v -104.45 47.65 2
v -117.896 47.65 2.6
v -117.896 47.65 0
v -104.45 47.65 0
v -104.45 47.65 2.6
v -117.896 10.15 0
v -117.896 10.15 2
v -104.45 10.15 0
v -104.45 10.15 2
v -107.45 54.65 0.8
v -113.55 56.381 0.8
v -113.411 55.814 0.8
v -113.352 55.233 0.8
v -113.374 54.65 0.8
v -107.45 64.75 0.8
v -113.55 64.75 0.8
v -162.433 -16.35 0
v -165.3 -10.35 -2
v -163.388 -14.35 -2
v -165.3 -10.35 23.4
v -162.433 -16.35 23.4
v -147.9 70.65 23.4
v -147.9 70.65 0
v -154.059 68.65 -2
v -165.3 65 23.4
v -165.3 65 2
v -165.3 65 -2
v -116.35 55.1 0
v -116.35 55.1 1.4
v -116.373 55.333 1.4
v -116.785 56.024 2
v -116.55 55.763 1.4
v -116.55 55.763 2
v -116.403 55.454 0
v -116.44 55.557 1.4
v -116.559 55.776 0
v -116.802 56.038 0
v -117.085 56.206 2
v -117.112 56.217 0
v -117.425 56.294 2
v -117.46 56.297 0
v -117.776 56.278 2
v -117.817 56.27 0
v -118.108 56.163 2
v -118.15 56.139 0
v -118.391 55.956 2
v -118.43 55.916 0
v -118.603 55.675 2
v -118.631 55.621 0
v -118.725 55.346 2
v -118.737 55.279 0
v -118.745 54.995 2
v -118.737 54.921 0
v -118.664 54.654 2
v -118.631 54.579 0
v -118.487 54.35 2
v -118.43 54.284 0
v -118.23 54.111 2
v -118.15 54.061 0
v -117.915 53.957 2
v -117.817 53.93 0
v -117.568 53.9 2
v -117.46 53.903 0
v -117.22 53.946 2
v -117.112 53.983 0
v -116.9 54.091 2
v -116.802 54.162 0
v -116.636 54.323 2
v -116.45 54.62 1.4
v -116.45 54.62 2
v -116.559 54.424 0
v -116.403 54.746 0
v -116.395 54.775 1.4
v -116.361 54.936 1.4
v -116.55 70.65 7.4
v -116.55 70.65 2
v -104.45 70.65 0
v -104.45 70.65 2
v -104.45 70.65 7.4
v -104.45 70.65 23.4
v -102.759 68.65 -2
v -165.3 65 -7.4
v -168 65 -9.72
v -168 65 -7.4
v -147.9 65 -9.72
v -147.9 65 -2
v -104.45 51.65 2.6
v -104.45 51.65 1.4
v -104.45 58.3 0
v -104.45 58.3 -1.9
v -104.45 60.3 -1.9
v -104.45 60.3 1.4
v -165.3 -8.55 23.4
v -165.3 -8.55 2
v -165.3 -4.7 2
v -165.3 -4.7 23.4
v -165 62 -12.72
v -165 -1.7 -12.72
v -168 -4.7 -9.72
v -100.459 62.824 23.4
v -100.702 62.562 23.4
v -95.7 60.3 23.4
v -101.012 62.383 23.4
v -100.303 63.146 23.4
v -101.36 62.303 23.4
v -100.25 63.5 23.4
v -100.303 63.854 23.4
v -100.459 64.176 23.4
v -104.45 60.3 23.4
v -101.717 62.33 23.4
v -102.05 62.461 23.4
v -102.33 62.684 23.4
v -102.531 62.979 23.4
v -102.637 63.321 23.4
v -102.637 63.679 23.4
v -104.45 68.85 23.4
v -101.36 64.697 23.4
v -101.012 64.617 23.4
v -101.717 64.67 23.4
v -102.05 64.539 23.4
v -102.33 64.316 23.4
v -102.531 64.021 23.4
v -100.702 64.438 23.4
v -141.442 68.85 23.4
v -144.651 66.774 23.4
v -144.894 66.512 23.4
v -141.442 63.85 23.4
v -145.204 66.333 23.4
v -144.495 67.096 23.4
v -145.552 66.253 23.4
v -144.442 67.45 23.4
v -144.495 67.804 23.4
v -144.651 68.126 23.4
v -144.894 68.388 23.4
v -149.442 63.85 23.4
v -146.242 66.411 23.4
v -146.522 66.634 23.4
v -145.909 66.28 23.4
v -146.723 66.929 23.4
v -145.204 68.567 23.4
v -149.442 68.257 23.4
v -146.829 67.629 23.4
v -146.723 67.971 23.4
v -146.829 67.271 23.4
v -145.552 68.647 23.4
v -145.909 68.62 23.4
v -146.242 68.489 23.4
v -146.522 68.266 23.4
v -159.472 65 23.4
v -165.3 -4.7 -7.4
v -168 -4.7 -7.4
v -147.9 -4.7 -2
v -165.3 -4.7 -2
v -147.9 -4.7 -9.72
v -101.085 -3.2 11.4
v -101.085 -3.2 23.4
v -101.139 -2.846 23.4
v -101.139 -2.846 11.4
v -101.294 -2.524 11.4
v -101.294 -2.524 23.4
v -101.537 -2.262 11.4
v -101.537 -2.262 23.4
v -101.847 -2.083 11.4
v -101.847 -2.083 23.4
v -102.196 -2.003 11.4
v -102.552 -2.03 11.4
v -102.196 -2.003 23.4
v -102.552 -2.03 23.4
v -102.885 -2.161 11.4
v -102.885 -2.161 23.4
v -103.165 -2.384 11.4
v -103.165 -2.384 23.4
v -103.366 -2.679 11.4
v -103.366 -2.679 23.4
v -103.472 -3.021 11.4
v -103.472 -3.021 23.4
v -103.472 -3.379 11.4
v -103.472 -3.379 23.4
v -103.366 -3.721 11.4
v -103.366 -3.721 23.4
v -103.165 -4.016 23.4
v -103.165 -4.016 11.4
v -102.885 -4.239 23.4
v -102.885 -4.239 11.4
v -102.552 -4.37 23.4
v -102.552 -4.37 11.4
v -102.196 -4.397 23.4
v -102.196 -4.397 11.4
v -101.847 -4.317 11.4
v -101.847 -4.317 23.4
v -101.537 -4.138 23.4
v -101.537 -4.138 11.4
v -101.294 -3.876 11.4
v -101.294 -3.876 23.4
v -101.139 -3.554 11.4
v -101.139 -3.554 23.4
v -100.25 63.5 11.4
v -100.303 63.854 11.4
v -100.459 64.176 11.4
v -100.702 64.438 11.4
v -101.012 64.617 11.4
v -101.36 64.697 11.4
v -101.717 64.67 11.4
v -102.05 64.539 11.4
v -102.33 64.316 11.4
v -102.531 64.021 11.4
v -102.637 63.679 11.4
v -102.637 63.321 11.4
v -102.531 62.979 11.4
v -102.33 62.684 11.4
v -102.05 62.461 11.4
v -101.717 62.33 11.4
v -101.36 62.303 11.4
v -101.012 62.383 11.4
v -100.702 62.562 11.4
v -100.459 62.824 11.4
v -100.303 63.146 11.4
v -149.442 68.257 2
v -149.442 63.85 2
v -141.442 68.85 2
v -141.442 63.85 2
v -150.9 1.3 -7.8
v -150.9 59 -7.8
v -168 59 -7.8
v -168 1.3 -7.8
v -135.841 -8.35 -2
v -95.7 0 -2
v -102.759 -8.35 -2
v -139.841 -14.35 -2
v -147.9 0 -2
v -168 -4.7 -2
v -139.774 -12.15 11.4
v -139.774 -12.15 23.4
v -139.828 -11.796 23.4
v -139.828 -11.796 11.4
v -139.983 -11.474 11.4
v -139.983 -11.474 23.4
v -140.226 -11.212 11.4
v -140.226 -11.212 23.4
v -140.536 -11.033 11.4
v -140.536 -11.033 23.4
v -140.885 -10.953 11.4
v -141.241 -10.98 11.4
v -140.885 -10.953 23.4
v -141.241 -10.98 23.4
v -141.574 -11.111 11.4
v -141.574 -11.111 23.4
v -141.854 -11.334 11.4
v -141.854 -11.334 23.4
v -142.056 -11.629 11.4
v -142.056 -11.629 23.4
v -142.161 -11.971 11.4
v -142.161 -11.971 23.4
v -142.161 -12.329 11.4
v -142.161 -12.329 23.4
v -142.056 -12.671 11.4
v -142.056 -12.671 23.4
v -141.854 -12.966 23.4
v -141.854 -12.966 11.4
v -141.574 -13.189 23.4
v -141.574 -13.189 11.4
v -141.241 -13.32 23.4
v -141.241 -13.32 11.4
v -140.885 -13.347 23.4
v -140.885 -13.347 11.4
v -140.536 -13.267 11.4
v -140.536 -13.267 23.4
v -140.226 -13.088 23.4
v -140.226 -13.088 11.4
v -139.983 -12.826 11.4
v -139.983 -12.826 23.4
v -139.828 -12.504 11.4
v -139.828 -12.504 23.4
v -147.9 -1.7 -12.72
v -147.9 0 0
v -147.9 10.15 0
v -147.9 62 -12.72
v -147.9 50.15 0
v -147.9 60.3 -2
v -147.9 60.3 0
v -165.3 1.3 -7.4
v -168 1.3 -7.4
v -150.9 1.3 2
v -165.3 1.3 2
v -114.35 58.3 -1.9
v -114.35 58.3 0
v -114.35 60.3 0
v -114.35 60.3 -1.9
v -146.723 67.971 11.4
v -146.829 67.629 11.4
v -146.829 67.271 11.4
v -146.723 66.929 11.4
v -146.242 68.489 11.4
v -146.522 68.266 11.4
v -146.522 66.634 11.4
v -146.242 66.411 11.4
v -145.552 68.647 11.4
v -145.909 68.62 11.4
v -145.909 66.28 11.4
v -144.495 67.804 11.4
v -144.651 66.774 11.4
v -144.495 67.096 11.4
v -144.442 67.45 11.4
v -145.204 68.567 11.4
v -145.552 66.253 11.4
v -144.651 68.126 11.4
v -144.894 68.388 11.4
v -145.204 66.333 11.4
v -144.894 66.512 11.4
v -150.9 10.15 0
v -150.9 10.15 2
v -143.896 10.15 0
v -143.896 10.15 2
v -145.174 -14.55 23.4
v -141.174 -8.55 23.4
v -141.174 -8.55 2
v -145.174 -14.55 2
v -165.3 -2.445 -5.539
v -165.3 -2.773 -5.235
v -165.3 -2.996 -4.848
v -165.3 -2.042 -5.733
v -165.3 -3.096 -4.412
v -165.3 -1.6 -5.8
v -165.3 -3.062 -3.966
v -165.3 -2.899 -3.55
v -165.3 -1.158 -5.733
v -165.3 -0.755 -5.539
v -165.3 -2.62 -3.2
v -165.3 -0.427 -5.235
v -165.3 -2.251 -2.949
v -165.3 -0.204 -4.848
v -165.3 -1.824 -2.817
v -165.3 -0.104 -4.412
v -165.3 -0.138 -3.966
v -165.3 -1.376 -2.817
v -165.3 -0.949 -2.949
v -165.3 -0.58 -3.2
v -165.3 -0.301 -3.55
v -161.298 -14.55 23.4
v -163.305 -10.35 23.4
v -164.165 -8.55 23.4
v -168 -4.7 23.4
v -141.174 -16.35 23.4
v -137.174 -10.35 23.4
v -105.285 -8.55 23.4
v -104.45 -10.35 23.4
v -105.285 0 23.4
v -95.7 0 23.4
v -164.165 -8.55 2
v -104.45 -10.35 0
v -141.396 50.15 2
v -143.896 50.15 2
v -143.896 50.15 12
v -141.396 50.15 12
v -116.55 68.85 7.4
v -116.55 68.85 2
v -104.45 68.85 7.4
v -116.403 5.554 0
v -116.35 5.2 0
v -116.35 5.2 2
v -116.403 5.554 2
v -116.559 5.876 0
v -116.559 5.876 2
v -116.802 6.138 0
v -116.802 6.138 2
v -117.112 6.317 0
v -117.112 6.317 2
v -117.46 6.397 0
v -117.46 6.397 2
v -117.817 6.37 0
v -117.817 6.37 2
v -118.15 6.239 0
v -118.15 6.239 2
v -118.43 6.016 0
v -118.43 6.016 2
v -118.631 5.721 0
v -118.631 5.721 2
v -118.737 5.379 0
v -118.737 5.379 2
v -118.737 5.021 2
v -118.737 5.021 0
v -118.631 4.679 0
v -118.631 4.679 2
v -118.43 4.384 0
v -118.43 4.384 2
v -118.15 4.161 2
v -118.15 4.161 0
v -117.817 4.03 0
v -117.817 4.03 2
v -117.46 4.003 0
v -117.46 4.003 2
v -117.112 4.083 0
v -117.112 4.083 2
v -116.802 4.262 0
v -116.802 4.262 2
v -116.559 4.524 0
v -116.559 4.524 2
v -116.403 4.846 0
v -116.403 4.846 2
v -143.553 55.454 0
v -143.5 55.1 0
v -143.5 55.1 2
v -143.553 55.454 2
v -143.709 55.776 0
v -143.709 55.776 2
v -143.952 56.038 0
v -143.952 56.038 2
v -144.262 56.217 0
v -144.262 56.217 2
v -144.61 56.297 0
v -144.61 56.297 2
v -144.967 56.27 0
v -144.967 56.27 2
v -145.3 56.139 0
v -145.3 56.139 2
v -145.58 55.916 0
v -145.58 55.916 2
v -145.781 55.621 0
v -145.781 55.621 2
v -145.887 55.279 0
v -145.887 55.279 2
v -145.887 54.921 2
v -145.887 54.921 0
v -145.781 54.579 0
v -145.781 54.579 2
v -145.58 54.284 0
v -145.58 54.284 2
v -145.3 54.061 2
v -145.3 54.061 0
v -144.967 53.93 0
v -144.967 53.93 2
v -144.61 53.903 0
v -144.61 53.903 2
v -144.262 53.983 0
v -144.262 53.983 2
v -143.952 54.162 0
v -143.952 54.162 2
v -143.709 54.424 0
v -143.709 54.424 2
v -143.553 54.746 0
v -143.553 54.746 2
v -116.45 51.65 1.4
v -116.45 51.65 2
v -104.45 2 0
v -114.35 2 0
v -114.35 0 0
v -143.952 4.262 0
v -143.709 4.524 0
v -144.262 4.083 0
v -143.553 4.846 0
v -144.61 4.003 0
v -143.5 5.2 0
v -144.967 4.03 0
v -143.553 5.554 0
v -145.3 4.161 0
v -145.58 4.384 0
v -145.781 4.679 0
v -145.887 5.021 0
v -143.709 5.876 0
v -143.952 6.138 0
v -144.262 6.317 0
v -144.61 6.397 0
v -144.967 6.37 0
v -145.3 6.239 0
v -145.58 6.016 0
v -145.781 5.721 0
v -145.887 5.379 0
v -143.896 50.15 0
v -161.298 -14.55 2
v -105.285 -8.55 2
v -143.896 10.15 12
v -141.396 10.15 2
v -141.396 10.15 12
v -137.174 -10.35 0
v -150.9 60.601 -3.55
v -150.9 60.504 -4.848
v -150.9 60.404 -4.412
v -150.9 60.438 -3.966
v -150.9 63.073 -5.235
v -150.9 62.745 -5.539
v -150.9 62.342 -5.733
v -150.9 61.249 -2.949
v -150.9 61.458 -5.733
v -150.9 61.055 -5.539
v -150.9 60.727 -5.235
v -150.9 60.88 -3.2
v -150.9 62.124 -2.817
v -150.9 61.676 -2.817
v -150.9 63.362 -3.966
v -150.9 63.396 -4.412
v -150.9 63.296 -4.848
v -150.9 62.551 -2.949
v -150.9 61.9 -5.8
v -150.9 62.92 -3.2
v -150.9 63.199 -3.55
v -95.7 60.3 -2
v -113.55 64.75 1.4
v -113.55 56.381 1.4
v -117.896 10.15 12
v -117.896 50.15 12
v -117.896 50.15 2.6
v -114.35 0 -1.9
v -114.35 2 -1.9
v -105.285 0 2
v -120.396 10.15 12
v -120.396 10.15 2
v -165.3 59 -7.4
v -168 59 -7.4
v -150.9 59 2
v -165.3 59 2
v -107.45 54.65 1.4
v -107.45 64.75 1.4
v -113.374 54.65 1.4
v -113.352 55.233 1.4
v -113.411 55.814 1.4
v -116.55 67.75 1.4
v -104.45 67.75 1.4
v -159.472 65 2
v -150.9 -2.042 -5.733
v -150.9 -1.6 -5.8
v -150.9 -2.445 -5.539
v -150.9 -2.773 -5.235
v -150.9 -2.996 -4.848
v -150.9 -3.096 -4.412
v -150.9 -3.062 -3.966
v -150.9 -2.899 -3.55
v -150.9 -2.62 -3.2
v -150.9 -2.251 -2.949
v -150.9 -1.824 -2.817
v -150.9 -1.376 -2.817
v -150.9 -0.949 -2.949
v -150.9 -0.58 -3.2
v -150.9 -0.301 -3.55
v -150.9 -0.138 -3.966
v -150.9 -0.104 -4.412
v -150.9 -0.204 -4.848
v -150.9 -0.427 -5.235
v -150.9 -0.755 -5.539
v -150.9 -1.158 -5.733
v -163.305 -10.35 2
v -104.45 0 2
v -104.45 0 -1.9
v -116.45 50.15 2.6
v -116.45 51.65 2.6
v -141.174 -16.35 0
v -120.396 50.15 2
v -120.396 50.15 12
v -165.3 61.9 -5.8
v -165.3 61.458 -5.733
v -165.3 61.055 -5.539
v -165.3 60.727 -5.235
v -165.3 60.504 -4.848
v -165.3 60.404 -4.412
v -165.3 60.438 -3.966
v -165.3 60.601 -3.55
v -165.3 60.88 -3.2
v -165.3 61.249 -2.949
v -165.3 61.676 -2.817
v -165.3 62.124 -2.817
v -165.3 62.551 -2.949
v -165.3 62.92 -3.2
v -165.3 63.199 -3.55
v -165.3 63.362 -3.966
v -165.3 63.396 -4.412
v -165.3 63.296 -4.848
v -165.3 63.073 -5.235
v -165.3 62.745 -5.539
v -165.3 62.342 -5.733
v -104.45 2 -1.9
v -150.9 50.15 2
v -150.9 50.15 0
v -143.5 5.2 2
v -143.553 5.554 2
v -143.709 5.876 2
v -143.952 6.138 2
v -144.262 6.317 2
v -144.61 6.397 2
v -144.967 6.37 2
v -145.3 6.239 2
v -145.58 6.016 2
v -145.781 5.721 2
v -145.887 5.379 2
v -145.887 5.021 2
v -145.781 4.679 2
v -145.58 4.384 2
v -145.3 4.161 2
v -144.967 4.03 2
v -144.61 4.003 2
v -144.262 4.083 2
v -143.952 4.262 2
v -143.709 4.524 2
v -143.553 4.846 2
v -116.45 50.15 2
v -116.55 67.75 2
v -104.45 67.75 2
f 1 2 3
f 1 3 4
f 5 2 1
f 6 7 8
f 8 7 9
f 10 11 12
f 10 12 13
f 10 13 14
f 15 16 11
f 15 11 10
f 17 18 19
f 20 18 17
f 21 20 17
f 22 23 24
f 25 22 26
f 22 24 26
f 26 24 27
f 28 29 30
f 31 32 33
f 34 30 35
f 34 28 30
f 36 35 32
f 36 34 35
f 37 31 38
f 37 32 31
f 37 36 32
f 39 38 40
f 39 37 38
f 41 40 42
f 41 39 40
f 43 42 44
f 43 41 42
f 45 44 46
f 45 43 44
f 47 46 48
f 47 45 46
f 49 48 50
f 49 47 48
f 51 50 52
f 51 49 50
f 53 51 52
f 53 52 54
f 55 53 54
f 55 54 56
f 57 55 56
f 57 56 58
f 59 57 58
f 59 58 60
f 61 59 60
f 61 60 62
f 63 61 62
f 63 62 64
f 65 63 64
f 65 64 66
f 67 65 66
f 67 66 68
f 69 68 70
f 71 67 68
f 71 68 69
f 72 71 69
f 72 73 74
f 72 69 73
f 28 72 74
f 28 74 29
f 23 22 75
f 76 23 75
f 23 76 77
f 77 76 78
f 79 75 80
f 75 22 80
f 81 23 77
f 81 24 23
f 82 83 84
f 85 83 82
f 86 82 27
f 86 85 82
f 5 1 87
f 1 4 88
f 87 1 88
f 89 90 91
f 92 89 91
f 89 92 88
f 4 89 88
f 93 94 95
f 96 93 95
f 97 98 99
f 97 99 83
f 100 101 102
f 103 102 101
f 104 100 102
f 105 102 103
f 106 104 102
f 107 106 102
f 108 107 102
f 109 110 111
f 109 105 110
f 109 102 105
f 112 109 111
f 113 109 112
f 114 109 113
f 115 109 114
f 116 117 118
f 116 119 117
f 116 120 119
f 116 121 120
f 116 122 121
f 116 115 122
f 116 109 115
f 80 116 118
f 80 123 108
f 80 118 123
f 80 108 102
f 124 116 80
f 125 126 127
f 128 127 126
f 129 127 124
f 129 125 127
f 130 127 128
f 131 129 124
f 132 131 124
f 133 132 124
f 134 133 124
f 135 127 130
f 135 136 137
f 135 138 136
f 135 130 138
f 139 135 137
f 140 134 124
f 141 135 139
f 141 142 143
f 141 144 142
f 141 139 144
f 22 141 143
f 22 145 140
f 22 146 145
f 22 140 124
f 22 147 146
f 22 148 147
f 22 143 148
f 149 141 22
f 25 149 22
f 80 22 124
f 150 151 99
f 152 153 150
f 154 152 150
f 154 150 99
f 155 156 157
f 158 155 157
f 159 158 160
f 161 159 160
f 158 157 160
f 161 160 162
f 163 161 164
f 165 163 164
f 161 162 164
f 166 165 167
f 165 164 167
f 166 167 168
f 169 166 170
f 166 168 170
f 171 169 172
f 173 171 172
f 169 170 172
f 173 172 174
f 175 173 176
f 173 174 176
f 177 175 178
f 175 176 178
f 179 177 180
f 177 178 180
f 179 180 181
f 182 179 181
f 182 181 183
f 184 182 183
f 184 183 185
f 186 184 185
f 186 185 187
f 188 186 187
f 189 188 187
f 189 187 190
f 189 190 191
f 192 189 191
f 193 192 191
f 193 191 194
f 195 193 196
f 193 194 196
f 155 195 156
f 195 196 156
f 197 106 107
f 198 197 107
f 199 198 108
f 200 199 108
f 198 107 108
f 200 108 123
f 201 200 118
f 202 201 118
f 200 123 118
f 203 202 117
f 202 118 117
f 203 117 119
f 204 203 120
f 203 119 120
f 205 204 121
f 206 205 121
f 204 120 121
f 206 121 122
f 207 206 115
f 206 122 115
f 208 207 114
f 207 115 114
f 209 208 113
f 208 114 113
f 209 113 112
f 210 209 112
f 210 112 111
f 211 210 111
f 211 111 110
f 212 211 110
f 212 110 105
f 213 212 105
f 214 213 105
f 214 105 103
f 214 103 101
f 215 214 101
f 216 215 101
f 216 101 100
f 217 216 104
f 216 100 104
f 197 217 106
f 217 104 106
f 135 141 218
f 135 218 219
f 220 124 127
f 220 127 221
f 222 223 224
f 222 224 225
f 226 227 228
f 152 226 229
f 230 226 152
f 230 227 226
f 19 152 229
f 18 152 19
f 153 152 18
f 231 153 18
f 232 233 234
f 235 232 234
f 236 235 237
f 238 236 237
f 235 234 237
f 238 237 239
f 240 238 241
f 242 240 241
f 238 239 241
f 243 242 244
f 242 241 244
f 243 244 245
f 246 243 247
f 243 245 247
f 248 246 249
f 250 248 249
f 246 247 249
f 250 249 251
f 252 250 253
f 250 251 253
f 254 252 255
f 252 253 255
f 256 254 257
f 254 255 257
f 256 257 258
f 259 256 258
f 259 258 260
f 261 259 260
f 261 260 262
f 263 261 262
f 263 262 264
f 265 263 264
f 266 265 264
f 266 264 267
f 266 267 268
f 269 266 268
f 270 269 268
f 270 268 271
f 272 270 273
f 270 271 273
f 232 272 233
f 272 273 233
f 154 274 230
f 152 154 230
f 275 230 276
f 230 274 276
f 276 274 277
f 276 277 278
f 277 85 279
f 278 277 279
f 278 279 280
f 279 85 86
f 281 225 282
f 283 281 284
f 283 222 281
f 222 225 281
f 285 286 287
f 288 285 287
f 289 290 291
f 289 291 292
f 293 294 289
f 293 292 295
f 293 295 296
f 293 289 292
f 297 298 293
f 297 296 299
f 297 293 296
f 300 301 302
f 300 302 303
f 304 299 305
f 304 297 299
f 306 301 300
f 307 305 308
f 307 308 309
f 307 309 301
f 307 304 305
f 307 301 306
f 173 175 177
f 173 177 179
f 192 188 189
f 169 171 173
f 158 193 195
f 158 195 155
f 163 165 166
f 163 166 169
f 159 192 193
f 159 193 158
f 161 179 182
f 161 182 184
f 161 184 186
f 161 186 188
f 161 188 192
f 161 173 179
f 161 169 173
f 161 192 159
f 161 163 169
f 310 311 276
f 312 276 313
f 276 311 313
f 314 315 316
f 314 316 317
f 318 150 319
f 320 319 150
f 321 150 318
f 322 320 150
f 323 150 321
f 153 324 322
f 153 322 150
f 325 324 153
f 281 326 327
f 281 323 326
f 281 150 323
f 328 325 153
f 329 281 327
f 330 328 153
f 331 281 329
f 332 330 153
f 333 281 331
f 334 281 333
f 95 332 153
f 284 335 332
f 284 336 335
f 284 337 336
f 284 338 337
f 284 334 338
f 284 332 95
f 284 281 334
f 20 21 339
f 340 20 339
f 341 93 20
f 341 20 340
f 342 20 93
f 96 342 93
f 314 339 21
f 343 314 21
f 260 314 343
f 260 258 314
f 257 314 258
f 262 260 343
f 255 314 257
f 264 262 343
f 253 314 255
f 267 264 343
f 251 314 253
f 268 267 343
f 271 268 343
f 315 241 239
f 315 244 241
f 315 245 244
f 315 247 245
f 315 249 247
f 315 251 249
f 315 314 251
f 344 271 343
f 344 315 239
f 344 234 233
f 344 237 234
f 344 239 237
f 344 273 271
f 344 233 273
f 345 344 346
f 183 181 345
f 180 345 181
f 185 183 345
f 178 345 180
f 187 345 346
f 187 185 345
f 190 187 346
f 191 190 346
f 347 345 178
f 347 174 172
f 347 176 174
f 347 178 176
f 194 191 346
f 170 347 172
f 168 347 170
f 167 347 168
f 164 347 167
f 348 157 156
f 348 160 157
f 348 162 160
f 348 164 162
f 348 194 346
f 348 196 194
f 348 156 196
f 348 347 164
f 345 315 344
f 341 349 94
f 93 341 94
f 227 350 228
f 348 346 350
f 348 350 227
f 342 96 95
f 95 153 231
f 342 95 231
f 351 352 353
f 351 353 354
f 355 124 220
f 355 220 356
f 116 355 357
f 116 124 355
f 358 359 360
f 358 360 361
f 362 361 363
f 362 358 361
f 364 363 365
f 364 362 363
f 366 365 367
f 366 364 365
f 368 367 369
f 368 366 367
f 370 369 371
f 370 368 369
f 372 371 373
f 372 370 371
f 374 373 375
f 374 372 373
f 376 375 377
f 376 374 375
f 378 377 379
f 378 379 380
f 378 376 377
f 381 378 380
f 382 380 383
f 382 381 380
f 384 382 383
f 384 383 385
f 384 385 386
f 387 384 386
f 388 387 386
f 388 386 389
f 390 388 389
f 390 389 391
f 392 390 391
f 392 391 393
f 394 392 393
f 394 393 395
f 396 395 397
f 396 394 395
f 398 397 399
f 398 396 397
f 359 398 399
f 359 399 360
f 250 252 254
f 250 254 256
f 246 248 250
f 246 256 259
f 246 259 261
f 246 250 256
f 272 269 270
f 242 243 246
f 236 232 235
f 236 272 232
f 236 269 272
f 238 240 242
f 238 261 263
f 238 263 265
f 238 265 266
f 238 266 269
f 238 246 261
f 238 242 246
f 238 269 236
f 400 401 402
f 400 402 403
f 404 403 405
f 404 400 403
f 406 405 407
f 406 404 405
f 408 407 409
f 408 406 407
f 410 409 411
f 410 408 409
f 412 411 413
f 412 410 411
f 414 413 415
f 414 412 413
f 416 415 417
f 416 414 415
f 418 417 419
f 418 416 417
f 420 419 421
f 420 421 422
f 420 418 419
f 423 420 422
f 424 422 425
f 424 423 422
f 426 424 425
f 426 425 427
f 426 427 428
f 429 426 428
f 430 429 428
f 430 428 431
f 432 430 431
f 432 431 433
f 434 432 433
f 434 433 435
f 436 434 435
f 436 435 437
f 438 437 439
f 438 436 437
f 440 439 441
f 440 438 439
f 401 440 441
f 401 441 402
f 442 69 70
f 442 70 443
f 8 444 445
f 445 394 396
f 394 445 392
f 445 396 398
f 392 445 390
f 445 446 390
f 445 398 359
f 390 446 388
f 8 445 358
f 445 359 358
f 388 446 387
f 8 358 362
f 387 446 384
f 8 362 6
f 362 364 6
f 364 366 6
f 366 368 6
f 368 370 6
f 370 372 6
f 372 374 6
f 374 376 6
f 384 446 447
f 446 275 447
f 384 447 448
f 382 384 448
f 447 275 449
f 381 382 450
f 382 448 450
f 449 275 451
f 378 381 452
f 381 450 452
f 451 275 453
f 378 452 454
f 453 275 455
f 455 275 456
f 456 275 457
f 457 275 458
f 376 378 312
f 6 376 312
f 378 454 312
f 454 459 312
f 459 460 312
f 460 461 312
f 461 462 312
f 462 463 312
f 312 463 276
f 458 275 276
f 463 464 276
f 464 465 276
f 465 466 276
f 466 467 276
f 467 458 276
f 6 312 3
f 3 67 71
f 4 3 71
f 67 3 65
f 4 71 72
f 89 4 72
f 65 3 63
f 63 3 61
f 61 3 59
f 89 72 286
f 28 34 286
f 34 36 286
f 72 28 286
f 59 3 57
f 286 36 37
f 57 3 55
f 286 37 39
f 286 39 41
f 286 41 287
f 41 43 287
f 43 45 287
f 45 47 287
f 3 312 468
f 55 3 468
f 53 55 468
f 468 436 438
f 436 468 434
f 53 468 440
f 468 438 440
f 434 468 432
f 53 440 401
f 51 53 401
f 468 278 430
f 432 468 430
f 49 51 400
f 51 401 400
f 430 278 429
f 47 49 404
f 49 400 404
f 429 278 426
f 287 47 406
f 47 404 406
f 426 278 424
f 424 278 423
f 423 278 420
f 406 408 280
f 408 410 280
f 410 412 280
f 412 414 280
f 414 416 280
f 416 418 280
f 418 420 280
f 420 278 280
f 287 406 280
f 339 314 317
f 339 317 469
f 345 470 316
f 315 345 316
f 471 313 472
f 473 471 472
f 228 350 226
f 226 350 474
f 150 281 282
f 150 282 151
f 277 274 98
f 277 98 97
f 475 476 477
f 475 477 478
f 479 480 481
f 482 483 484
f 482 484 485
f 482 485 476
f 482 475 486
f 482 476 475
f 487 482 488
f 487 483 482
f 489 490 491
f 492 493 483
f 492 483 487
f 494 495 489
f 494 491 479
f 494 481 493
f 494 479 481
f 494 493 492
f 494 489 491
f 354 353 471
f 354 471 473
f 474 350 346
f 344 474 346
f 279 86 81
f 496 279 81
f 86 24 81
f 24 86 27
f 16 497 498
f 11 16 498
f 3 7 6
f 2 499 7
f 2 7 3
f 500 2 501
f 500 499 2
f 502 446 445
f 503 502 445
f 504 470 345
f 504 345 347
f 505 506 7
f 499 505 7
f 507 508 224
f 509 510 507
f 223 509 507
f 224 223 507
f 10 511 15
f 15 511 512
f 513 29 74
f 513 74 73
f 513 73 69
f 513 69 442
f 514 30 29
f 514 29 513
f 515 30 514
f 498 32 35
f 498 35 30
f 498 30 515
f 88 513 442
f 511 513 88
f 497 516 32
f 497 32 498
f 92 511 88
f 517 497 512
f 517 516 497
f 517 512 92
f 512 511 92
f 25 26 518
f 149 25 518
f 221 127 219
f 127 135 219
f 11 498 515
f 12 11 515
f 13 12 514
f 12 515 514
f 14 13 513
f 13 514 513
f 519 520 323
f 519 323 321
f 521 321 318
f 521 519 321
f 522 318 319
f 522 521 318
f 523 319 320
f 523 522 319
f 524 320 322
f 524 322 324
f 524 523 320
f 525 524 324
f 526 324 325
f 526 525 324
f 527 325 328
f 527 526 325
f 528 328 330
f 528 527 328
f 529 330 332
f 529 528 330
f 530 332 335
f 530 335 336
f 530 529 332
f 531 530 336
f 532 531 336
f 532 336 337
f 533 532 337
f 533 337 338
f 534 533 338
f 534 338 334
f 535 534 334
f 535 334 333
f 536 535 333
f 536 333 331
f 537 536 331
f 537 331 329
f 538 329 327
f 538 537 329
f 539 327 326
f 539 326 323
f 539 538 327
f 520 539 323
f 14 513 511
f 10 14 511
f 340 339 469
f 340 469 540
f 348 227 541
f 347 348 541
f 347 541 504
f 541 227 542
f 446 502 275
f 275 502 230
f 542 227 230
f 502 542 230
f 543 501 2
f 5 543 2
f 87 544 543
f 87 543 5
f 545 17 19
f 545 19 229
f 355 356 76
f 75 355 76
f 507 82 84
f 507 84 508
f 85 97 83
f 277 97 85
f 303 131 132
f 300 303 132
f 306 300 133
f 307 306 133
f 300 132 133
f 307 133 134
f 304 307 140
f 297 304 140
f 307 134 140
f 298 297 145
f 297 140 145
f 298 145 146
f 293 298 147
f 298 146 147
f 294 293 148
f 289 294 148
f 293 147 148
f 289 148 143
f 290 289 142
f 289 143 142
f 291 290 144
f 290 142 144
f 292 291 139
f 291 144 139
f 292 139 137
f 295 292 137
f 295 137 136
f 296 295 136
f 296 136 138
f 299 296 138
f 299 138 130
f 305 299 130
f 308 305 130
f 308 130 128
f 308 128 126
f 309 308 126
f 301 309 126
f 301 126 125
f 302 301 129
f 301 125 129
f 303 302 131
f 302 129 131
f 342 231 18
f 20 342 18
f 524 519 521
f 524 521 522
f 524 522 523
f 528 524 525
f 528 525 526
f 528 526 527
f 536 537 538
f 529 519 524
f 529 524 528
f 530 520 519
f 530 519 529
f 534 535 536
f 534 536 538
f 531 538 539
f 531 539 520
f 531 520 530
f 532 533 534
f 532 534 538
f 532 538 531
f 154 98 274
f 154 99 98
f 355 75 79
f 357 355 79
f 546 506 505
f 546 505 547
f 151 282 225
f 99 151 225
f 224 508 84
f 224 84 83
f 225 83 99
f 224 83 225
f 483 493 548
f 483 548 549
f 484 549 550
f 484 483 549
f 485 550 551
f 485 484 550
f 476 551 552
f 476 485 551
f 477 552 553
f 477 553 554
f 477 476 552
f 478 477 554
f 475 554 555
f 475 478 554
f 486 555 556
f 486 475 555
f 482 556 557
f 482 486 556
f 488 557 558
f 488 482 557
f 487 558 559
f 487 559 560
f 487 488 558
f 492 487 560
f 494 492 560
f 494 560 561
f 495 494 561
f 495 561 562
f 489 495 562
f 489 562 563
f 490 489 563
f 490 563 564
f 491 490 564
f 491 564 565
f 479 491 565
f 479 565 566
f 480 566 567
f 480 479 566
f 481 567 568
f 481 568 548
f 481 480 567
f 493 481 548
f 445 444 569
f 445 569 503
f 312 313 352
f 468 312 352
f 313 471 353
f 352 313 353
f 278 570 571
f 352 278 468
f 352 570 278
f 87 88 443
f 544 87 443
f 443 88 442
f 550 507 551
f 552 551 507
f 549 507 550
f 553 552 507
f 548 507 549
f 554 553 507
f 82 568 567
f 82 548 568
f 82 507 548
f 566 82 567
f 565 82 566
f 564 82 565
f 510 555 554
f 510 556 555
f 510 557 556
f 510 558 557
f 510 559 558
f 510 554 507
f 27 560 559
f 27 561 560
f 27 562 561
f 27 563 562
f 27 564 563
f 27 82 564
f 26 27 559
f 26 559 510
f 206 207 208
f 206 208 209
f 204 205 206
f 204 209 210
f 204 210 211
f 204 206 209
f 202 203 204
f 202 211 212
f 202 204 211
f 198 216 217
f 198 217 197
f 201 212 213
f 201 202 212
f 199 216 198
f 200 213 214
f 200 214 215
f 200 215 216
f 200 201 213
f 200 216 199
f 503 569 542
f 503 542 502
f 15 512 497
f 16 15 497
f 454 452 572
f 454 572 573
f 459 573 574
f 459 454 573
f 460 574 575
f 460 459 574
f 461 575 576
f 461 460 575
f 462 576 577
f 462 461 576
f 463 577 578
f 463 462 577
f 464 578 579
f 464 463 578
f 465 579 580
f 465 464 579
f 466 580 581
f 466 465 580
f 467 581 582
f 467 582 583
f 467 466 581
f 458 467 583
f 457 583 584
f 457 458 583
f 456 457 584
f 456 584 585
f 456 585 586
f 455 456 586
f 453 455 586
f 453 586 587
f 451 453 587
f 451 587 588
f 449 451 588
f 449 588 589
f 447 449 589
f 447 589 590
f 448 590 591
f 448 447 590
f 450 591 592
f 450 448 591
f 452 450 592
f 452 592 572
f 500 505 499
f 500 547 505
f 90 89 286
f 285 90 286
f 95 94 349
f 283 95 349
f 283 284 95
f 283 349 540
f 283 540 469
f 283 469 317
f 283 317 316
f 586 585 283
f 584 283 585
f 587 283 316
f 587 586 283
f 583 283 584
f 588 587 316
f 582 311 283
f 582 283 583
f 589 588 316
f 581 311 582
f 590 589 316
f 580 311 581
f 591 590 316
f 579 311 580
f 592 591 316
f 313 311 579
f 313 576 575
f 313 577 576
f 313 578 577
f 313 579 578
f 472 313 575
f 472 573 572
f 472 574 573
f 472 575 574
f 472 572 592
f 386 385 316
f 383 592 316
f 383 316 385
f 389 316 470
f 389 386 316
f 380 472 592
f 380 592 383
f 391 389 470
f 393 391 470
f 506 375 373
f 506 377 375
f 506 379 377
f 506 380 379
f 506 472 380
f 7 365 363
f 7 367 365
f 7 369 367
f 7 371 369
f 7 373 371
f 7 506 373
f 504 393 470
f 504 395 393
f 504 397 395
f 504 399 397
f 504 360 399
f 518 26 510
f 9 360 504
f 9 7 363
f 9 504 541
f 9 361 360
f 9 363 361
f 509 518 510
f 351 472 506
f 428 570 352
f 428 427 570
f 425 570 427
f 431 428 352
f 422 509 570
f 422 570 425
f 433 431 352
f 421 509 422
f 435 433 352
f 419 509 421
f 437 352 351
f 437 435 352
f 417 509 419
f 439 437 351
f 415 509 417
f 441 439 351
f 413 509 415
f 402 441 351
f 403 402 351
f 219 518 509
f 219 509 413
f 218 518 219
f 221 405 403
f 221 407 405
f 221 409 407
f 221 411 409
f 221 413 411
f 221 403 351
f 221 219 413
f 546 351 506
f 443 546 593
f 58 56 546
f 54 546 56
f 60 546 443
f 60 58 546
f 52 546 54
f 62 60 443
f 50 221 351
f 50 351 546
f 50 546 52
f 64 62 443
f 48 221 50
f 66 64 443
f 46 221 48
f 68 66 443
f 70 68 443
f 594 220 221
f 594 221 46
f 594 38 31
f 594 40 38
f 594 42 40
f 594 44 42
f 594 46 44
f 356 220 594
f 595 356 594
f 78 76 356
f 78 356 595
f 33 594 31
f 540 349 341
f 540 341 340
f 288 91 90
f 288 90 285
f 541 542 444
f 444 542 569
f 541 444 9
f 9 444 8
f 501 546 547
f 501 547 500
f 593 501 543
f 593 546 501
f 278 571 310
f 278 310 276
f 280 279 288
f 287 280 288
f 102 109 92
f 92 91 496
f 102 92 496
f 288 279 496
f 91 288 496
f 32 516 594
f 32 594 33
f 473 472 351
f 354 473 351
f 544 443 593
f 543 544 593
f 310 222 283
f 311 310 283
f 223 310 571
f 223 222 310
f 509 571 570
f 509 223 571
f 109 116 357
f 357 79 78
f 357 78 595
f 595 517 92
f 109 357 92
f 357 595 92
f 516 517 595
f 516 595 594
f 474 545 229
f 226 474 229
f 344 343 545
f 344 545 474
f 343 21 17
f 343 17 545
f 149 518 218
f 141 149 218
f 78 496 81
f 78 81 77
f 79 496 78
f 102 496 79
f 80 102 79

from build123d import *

# Parameters (mm, degrees)
SKETCH_1_W          = 33.55
SKETCH_1_H          = 60.3
SKETCH_1_R          = 1.2
EXTRUDE_1_DEPTH     = 2
SKETCH_2_W          = 2
SKETCH_2_H          = 60.3
EXTRUDE_2_DEPTH     = 9.9
SKETCH_3_W          = 9.9
SKETCH_3_H          = 2
EXTRUDE_3_DEPTH     = 1.9
SKETCH_4_W          = 10.719852834
SKETCH_4_H          = 56.3
SKETCH_4_W_2        = 2
SKETCH_4_H_2        = 60.3
EXTRUDE_5_DEPTH     = 3
SKETCH_6_W          = 14.719852834
SKETCH_6_H          = 4.7
EXTRUDE_6_DEPTH     = 3
SKETCH_7_W          = 9.4
SKETCH_7_H          = 6
SKETCH_7_R          = 1.5
EXTRUDE_7_DEPTH     = 14.4
EXTRUDE_8_DEPTH     = 17.1
EXTRUDE_9_DEPTH     = 8.35
SKETCH_10_W         = 43.45
SKETCH_10_H         = 4
EXTRUDE_10_DEPTH    = 8.35
CUT_EXTRUDE_START   = -0.6
CUT_EXTRUDE_1_DEPTH = 0.6
CUT_EXTRUDE_2_DEPTH = 0.6
SKETCH_13_W         = 43.45
SKETCH_13_H         = 4
EXTRUDE_11_DEPTH    = 2
SKETCH_14_W         = 43.45
SKETCH_14_H         = 4
EXTRUDE_12_DEPTH    = 2
EXTRUDE_13_DEPTH    = 4
SKETCH_16_W         = 2.5
SKETCH_16_H         = 40
EXTRUDE_14_DEPTH    = 10
SKETCH_17_W         = 4
SKETCH_17_H         = 5.65
EXTRUDE_15_DEPTH    = 17.4
EXTRUDE_16_DEPTH    = 4
SKETCH_19_W         = 1.8
SKETCH_19_H         = 1.8
EXTRUDE_17_DEPTH    = 21.4
SKETCH_20_W         = 12.1
SKETCH_20_H         = 1.8
EXTRUDE_18_DEPTH    = 16
EXTRUDE_START       = -4
EXTRUDE_22_DEPTH    = 25.4
EXTRUDE_23_DEPTH    = 25.4
CUT_EXTRUDE_3_DEPTH = 21.4
EXTRUDE_24_DEPTH    = 4
EXTRUDE_25_DEPTH    = 21.4
SKETCH_26_W         = 1.445945033
SKETCH_26_H         = 2.5
EXTRUDE_26_DEPTH    = 10
EXTRUDE_27_DEPTH    = 21.4
EXTRUDE_28_DEPTH    = 21.4
SKETCH_29_W         = 21.4
SKETCH_29_H         = 5
EXTRUDE_29_DEPTH    = 3
SKETCH_30_R         = 1.2
CUT_EXTRUDE_4_DEPTH = 12
SKETCH_31_W         = 13.445945033
SKETCH_31_H         = 37.5
SKETCH_31_W_2       = 7.004054967
SKETCH_31_H_2       = 40
CUT_EXTRUDE_5_DEPTH = 2
CUT_EXTRUDE_START_2 = -9.4
CUT_EXTRUDE_6_DEPTH = 9.4
CHAMFER_2_SIZE      = 2
CHAMFER_3_SIZE      = 3
CHAMFER_4_SIZE      = 3


with BuildPart() as part:
    # 草图1 → 凸台-拉伸1 (new body)
    with BuildSketch(Plane.XY):
        with Locations((-131.125, 30.15)):
            Rectangle(SKETCH_1_W, SKETCH_1_H)
        with Locations((-144.7, 5.2)):
            Circle(SKETCH_1_R, mode=Mode.SUBTRACT)
        with Locations((-117.55, 5.2)):
            Circle(SKETCH_1_R, mode=Mode.SUBTRACT)
        with Locations((-117.55, 55.1)):
            Circle(SKETCH_1_R, mode=Mode.SUBTRACT)
        with Locations((-144.7, 55.1)):
            Circle(SKETCH_1_R, mode=Mode.SUBTRACT)
    extrude(amount=EXTRUDE_1_DEPTH)

    # 草图2 → 凸台-拉伸2 (add)
    with BuildSketch(Plane(origin=(-114.35, 0, 0), x_dir=(0, 0, -1), z_dir=(1, 0, 0))):
        with Locations((-1, 30.15)):
            Rectangle(SKETCH_2_W, SKETCH_2_H)
    extrude(amount=EXTRUDE_2_DEPTH)

    # 草图3 → 凸台-拉伸3 (add)
    with BuildSketch(Plane(origin=(0, 0, 0), x_dir=(-1, 0, 0), z_dir=(0, 0, -1))):
        with Locations((109.4, 59.3)):
            Rectangle(SKETCH_3_W, SKETCH_3_H)
        with Locations((109.4, 1)):
            Rectangle(SKETCH_3_W, SKETCH_3_H)
    extrude(amount=EXTRUDE_3_DEPTH)

    # 草图4 → 凸台-拉伸5 (add)
    with BuildSketch(Plane.ZY.offset(147.9)):
        Polygon((0, 60.3), (-12.719852834, 60.3), (-12.719852834, 58.3), (-2, 58.3), (-2, 2), (-12.719852834, 2), (-12.719852834, 0), (0, 0), align=None)
        with Locations((-7.359926417, 30.15)):
            Rectangle(SKETCH_4_W, SKETCH_4_H)
        with Locations((1, 30.15)):
            Rectangle(SKETCH_4_W_2, SKETCH_4_H_2)
    extrude(amount=EXTRUDE_5_DEPTH)

    # 草图6 → 凸台-拉伸6 (add)
    with BuildSketch(Plane.ZY.offset(150.9)):
        with Locations((-5.359926417, 62.65)):
            Rectangle(SKETCH_6_W, SKETCH_6_H)
        with Locations((-5.359926417, -2.35)):
            Rectangle(SKETCH_6_W, SKETCH_6_H)
    extrude(amount=-EXTRUDE_6_DEPTH)

    # 草图7 → 凸台-拉伸7 (add)
    # profile 1 of 2: a face of its own
    with BuildSketch(Plane.ZY.offset(150.9)):
        with Locations((-2.7, 62)):
            Rectangle(SKETCH_7_W, SKETCH_7_H)
        with Locations(Location((-4.3, 61.9, 0), (0, 0, 180))):
            Circle(SKETCH_7_R, mode=Mode.SUBTRACT)
    # profile 2 of 2: a face of its own
    with BuildSketch(Plane.ZY.offset(150.9)):
        with Locations((-2.7, -1.7)):
            Rectangle(SKETCH_7_W, SKETCH_7_H)
        with Locations(Location((-4.3, -1.6, 0), (0, 0, 180))):
            Circle(SKETCH_7_R, mode=Mode.SUBTRACT)
    extrude(amount=EXTRUDE_7_DEPTH)

    # 草图8 → 凸台-拉伸8 (add)
    with BuildSketch(Plane.ZY.offset(150.9)):
        Polygon((-7.8, 59), (-7.8, 1.3), (-7.4, 1.3), (-7.4, -4.7), (-12.719852834, -4.7), (-12.719852834, 65), (-7.4, 65), (-7.4, 59), align=None)
    extrude(amount=EXTRUDE_8_DEPTH)

    # 草图9 → 凸台-拉伸9 (add)
    with BuildSketch(Plane(origin=(0, 60.3, 0), x_dir=(1, 0, 0), z_dir=(0, 1, 0))):
        Polygon((-114.35, 1.9), (-114.35, 0), (-147.9, 0), (-147.9, -2), (-104.45, -2), (-104.45, 1.9), align=None)
        Polygon((-114.35, 1.9), (-104.45, 1.9), (-104.45, 2), (-147.9, 2), (-147.9, 0), (-114.35, 0), align=None)
    extrude(amount=EXTRUDE_9_DEPTH)

    # 草图10 → 凸台-拉伸10 (add)
    with BuildSketch(Plane.XZ):
        with Locations((-126.175, 0)):
            Rectangle(SKETCH_10_W, SKETCH_10_H)
    extrude(amount=EXTRUDE_10_DEPTH)

    # 草图11 → 切除-拉伸1 (cut)
    with BuildSketch(Plane.XY.offset(2).offset(CUT_EXTRUDE_START)):
        with BuildLine():
            Line((-104.45, 51.65), (-104.45, 67.75))
            Line((-104.45, 67.75), (-116.55, 67.75))
            Line((-116.55, 67.75), (-116.55, 55.763324958))
            ThreePointArc((-116.55, 55.763324958), (-116.354567134, 55.204595711), (-116.45, 54.620416848))
            Line((-116.45, 54.620416848), (-116.45, 51.65))
            Line((-116.45, 51.65), (-104.45, 51.65))
        make_face()
    extrude(amount=CUT_EXTRUDE_1_DEPTH, mode=Mode.SUBTRACT)

    # 草图12 → 切除-拉伸2 (cut)
    with BuildSketch(Plane.XY.offset(1.4)):
        with BuildLine():
            Line((-113.374176728, 54.65), (-107.45, 54.65))
            Line((-107.45, 54.65), (-107.45, 64.75))
            Line((-107.45, 64.75), (-113.55, 64.75))
            Line((-113.55, 64.75), (-113.55, 56.380624847))
            ThreePointArc((-113.55, 56.380624847), (-113.371508988, 55.524514858), (-113.374176728, 54.65))
        make_face()
    extrude(amount=-CUT_EXTRUDE_2_DEPTH, mode=Mode.SUBTRACT)

    # 草图13 → 凸台-拉伸11 (add)
    with BuildSketch(Plane(origin=(0, 68.65, 0), x_dir=(1, 0, 0), z_dir=(0, 1, 0))):
        with Locations((-126.175, 0)):
            Rectangle(SKETCH_13_W, SKETCH_13_H)
    extrude(amount=EXTRUDE_11_DEPTH)

    # 草图14 → 凸台-拉伸12 (add)
    with BuildSketch(Plane.XZ.offset(8.35)):
        with Locations((-126.175, 0)):
            Rectangle(SKETCH_14_W, SKETCH_14_H)
    extrude(amount=EXTRUDE_12_DEPTH)

    # 草图15 → 凸台-拉伸13 (add)
    with BuildSketch(Plane.XY.offset(2)):
        Polygon((-147.9, 70.65), (-165.3, 65), (-147.9, 65), align=None)
    extrude(amount=-EXTRUDE_13_DEPTH)

    # 草图16 → 凸台-拉伸14 (add)
    with BuildSketch(Plane.XY.offset(2)):
        with Locations((-142.645945033, 30.15)):
            Rectangle(SKETCH_16_W, SKETCH_16_H)
        with Locations((-119.145945033, 30.15)):
            Rectangle(SKETCH_16_W, SKETCH_16_H)
    extrude(amount=EXTRUDE_14_DEPTH)

    # 草图17 → 凸台-拉伸15 (add)
    with BuildSketch(Plane.ZY.offset(147.9)):
        with Locations((0, -7.525)):
            Rectangle(SKETCH_17_W, SKETCH_17_H)
    extrude(amount=EXTRUDE_15_DEPTH)

    # 草图18 → 凸台-拉伸16 (add)
    with BuildSketch(Plane.XY.offset(2)):
        Polygon((-104.45, 67.75), (-104.45, 60.3), (-95.7, 60.3), (-104.45, 70.65), align=None)
        Polygon((-104.45, 0), (-104.45, -10.35), (-95.7, 0), align=None)
    extrude(amount=-EXTRUDE_16_DEPTH)

    # 草图19 → 凸台-拉伸17 (add)
    with BuildSketch(Plane.XY.offset(2)):
        Polygon((-165.3, 65), (-159.471717964, 65), (-147.615080796, 68.85), (-118.35, 68.85), (-118.35, 70.65), (-147.9, 70.65), align=None)
        with Locations((-117.45, 69.75)):
            Rectangle(SKETCH_19_W, SKETCH_19_H)
        Polygon((-95.7, 60.3), (-104.45, 70.65), (-104.45, 67.861945247), (-102.65, 65.73280239), (-99.57879025, 62.1), (-99.57879025, 60.3), align=None)
        Polygon((-105.285311989, -8.55), (-163.5, -8.55), (-165.3, -8.55), (-165.3, -10.35), (-104.45, -10.35), (-95.7, 0), (-99.57879025, 0), (-99.57879025, -1.8), align=None)
    extrude(amount=EXTRUDE_17_DEPTH)

    # 草图20 → 凸台-拉伸18 (add)
    with BuildSketch(Plane.XY.offset(23.4)):
        with Locations((-110.5, 69.75)):
            Rectangle(SKETCH_20_W, SKETCH_20_H)
    extrude(amount=-EXTRUDE_18_DEPTH)

    # 草图21 → 凸台-拉伸22 (add)
    with BuildSketch(Plane.XY.offset(2).offset(EXTRUDE_START)):
        Polygon((-165.3, -8.55), (-165.3, -4.7), (-168, -4.7), (-165.3, -10.35), align=None)
    extrude(amount=EXTRUDE_22_DEPTH)

    # 草图22 → 凸台-拉伸23 (add)
    with BuildSketch(Plane.XY.offset(23.4)):
        Polygon((-163.305030212, -10.35), (-165.3, -10.35), (-162.432743363, -16.35), (-141.174369577, -16.35), (-137.174369577, -10.35), (-138.374369577, -10.35), (-141.174369577, -14.55), (-161.297950566, -14.55), align=None)
    extrude(amount=-EXTRUDE_23_DEPTH)

    # 草图23 → 切除-拉伸3 (cut)
    with BuildSketch(Plane.XY.offset(23.4)):
        Polygon((-164.165207203, -8.55), (-163.305030212, -10.35), (-138.374369577, -10.35), (-137.174369577, -8.55), align=None)
    extrude(amount=-CUT_EXTRUDE_3_DEPTH, mode=Mode.SUBTRACT)

    # 草图24 → 凸台-拉伸24 (add)
    with BuildSketch(Plane(origin=(0, 0, -2), x_dir=(-1, 0, 0), z_dir=(0, 0, -1))):
        Polygon((141.174369577, -14.55), (161.297950566, -14.55), (163.305030212, -10.35), (138.374369577, -10.35), align=None)
    extrude(amount=-EXTRUDE_24_DEPTH)

    # 草图25 → 凸台-拉伸25 (add)
    with BuildSketch(Plane.XY.offset(2)):
        Polygon((-147.615080796, 68.85), (-149.4421323, 68.256733276), (-149.4421323, 63.85), (-144.4421323, 63.85), (-144.4421323, 68.85), align=None)
        Polygon((-141.174369577, -8.55), (-141.174369577, -14.55), (-137.174369577, -8.55), align=None)
        Polygon((-105.285311989, 0), (-104.45, 0), (-99.57879025, 0), (-99.57879025, -1.8), (-105.285311989, -8.55), align=None)
    extrude(amount=EXTRUDE_25_DEPTH)

    # 草图26 → 凸台-拉伸26 (add)
    with BuildSketch(Plane.XY.offset(2)):
        Polygon((-116.45, 50.15), (-116.45, 47.65), (-104.45, 47.65), (-104.45, 51.65), (-116.45, 51.65), align=None)
        with Locations((-117.172972517, 48.9)):
            Rectangle(SKETCH_26_W, SKETCH_26_H)
    extrude(amount=EXTRUDE_26_DEPTH)

    # 草图27 → 凸台-拉伸27 (add)
    with BuildSketch(Plane.XY.offset(2)):
        Polygon((-104.45, 67.861945247), (-104.45, 67.75), (-104.45, 60.3), (-99.57879025, 60.3), (-99.57879025, 62.1), align=None)
    extrude(amount=EXTRUDE_27_DEPTH)

    # 草图28 → 凸台-拉伸28 (add)
    with BuildSketch(Plane.XY.offset(23.4)):
        Polygon((-141.174369577, -14.55), (-141.174369577, -8.55), (-145.174369577, -14.55), align=None)
    extrude(amount=-EXTRUDE_28_DEPTH)

    # 草图29 → 凸台-拉伸29 (add)
    with BuildSketch(Plane(origin=(-144.4421323, 0, 0), x_dir=(0, 0, -1), z_dir=(1, 0, 0))):
        with Locations((-12.7, 66.35)):
            Rectangle(SKETCH_29_W, SKETCH_29_H)
    extrude(amount=EXTRUDE_29_DEPTH)

    # 草图30 → 切除-拉伸4 (cut)
    with BuildSketch(Plane.XY.offset(23.4)):
        with Locations((-102.285311989, -3.2)):
            Circle(SKETCH_30_R)
        with Locations((-101.45, 63.5)):
            Circle(SKETCH_30_R)
        with Locations((-140.974369577, -12.15)):
            Circle(SKETCH_30_R)
        with Locations((-145.6421323, 67.45)):
            Circle(SKETCH_30_R)
    extrude(amount=-CUT_EXTRUDE_4_DEPTH, mode=Mode.SUBTRACT)

    # 草图31 → 切除-拉伸5 (cut)
    with BuildSketch(Plane.XY.offset(2)):
        with Locations((-111.172972517, 28.9)):
            Rectangle(SKETCH_31_W, SKETCH_31_H)
        with Locations((-147.397972517, 30.15)):
            Rectangle(SKETCH_31_W_2, SKETCH_31_H_2)
    extrude(amount=-CUT_EXTRUDE_5_DEPTH, mode=Mode.SUBTRACT)

    # 草图32 → 切除-拉伸6 (cut)
    with BuildSketch(Plane.XY.offset(12).offset(CUT_EXTRUDE_START_2)):
        Polygon((-117.895945033, 50.15), (-117.895945033, 47.65), (-104.45, 47.65), (-104.45, 51.65), (-116.45, 51.65), (-116.45, 50.15), align=None)
    extrude(amount=CUT_EXTRUDE_6_DEPTH, mode=Mode.SUBTRACT)

    # 倒角2
    chamfer_2_edges = [part.edges().sort_by_distance(p)[0] for p in [
        (-126.175, 70.65, -2),
        (-120.812184789, -10.35, -2),
        (-151.80355647, -16.35, -2),
    ]]
    chamfer(chamfer_2_edges, length=CHAMFER_2_SIZE)

    # 倒角3
    chamfer_3_edges = [part.edges().sort_by_distance(p)[0] for p in [
        (-157.95, -4.7, -12.719852834),
        (-157.95, 65, -12.719852834),
    ]]
    chamfer(chamfer_3_edges, length=CHAMFER_3_SIZE)

    # 倒角4
    chamfer_4_edges = [part.edges().sort_by_distance(p)[0] for p in [
        (-168, 30.15, -12.719852834),
    ]]
    chamfer(chamfer_4_edges, length=CHAMFER_4_SIZE)


solid = part.part
